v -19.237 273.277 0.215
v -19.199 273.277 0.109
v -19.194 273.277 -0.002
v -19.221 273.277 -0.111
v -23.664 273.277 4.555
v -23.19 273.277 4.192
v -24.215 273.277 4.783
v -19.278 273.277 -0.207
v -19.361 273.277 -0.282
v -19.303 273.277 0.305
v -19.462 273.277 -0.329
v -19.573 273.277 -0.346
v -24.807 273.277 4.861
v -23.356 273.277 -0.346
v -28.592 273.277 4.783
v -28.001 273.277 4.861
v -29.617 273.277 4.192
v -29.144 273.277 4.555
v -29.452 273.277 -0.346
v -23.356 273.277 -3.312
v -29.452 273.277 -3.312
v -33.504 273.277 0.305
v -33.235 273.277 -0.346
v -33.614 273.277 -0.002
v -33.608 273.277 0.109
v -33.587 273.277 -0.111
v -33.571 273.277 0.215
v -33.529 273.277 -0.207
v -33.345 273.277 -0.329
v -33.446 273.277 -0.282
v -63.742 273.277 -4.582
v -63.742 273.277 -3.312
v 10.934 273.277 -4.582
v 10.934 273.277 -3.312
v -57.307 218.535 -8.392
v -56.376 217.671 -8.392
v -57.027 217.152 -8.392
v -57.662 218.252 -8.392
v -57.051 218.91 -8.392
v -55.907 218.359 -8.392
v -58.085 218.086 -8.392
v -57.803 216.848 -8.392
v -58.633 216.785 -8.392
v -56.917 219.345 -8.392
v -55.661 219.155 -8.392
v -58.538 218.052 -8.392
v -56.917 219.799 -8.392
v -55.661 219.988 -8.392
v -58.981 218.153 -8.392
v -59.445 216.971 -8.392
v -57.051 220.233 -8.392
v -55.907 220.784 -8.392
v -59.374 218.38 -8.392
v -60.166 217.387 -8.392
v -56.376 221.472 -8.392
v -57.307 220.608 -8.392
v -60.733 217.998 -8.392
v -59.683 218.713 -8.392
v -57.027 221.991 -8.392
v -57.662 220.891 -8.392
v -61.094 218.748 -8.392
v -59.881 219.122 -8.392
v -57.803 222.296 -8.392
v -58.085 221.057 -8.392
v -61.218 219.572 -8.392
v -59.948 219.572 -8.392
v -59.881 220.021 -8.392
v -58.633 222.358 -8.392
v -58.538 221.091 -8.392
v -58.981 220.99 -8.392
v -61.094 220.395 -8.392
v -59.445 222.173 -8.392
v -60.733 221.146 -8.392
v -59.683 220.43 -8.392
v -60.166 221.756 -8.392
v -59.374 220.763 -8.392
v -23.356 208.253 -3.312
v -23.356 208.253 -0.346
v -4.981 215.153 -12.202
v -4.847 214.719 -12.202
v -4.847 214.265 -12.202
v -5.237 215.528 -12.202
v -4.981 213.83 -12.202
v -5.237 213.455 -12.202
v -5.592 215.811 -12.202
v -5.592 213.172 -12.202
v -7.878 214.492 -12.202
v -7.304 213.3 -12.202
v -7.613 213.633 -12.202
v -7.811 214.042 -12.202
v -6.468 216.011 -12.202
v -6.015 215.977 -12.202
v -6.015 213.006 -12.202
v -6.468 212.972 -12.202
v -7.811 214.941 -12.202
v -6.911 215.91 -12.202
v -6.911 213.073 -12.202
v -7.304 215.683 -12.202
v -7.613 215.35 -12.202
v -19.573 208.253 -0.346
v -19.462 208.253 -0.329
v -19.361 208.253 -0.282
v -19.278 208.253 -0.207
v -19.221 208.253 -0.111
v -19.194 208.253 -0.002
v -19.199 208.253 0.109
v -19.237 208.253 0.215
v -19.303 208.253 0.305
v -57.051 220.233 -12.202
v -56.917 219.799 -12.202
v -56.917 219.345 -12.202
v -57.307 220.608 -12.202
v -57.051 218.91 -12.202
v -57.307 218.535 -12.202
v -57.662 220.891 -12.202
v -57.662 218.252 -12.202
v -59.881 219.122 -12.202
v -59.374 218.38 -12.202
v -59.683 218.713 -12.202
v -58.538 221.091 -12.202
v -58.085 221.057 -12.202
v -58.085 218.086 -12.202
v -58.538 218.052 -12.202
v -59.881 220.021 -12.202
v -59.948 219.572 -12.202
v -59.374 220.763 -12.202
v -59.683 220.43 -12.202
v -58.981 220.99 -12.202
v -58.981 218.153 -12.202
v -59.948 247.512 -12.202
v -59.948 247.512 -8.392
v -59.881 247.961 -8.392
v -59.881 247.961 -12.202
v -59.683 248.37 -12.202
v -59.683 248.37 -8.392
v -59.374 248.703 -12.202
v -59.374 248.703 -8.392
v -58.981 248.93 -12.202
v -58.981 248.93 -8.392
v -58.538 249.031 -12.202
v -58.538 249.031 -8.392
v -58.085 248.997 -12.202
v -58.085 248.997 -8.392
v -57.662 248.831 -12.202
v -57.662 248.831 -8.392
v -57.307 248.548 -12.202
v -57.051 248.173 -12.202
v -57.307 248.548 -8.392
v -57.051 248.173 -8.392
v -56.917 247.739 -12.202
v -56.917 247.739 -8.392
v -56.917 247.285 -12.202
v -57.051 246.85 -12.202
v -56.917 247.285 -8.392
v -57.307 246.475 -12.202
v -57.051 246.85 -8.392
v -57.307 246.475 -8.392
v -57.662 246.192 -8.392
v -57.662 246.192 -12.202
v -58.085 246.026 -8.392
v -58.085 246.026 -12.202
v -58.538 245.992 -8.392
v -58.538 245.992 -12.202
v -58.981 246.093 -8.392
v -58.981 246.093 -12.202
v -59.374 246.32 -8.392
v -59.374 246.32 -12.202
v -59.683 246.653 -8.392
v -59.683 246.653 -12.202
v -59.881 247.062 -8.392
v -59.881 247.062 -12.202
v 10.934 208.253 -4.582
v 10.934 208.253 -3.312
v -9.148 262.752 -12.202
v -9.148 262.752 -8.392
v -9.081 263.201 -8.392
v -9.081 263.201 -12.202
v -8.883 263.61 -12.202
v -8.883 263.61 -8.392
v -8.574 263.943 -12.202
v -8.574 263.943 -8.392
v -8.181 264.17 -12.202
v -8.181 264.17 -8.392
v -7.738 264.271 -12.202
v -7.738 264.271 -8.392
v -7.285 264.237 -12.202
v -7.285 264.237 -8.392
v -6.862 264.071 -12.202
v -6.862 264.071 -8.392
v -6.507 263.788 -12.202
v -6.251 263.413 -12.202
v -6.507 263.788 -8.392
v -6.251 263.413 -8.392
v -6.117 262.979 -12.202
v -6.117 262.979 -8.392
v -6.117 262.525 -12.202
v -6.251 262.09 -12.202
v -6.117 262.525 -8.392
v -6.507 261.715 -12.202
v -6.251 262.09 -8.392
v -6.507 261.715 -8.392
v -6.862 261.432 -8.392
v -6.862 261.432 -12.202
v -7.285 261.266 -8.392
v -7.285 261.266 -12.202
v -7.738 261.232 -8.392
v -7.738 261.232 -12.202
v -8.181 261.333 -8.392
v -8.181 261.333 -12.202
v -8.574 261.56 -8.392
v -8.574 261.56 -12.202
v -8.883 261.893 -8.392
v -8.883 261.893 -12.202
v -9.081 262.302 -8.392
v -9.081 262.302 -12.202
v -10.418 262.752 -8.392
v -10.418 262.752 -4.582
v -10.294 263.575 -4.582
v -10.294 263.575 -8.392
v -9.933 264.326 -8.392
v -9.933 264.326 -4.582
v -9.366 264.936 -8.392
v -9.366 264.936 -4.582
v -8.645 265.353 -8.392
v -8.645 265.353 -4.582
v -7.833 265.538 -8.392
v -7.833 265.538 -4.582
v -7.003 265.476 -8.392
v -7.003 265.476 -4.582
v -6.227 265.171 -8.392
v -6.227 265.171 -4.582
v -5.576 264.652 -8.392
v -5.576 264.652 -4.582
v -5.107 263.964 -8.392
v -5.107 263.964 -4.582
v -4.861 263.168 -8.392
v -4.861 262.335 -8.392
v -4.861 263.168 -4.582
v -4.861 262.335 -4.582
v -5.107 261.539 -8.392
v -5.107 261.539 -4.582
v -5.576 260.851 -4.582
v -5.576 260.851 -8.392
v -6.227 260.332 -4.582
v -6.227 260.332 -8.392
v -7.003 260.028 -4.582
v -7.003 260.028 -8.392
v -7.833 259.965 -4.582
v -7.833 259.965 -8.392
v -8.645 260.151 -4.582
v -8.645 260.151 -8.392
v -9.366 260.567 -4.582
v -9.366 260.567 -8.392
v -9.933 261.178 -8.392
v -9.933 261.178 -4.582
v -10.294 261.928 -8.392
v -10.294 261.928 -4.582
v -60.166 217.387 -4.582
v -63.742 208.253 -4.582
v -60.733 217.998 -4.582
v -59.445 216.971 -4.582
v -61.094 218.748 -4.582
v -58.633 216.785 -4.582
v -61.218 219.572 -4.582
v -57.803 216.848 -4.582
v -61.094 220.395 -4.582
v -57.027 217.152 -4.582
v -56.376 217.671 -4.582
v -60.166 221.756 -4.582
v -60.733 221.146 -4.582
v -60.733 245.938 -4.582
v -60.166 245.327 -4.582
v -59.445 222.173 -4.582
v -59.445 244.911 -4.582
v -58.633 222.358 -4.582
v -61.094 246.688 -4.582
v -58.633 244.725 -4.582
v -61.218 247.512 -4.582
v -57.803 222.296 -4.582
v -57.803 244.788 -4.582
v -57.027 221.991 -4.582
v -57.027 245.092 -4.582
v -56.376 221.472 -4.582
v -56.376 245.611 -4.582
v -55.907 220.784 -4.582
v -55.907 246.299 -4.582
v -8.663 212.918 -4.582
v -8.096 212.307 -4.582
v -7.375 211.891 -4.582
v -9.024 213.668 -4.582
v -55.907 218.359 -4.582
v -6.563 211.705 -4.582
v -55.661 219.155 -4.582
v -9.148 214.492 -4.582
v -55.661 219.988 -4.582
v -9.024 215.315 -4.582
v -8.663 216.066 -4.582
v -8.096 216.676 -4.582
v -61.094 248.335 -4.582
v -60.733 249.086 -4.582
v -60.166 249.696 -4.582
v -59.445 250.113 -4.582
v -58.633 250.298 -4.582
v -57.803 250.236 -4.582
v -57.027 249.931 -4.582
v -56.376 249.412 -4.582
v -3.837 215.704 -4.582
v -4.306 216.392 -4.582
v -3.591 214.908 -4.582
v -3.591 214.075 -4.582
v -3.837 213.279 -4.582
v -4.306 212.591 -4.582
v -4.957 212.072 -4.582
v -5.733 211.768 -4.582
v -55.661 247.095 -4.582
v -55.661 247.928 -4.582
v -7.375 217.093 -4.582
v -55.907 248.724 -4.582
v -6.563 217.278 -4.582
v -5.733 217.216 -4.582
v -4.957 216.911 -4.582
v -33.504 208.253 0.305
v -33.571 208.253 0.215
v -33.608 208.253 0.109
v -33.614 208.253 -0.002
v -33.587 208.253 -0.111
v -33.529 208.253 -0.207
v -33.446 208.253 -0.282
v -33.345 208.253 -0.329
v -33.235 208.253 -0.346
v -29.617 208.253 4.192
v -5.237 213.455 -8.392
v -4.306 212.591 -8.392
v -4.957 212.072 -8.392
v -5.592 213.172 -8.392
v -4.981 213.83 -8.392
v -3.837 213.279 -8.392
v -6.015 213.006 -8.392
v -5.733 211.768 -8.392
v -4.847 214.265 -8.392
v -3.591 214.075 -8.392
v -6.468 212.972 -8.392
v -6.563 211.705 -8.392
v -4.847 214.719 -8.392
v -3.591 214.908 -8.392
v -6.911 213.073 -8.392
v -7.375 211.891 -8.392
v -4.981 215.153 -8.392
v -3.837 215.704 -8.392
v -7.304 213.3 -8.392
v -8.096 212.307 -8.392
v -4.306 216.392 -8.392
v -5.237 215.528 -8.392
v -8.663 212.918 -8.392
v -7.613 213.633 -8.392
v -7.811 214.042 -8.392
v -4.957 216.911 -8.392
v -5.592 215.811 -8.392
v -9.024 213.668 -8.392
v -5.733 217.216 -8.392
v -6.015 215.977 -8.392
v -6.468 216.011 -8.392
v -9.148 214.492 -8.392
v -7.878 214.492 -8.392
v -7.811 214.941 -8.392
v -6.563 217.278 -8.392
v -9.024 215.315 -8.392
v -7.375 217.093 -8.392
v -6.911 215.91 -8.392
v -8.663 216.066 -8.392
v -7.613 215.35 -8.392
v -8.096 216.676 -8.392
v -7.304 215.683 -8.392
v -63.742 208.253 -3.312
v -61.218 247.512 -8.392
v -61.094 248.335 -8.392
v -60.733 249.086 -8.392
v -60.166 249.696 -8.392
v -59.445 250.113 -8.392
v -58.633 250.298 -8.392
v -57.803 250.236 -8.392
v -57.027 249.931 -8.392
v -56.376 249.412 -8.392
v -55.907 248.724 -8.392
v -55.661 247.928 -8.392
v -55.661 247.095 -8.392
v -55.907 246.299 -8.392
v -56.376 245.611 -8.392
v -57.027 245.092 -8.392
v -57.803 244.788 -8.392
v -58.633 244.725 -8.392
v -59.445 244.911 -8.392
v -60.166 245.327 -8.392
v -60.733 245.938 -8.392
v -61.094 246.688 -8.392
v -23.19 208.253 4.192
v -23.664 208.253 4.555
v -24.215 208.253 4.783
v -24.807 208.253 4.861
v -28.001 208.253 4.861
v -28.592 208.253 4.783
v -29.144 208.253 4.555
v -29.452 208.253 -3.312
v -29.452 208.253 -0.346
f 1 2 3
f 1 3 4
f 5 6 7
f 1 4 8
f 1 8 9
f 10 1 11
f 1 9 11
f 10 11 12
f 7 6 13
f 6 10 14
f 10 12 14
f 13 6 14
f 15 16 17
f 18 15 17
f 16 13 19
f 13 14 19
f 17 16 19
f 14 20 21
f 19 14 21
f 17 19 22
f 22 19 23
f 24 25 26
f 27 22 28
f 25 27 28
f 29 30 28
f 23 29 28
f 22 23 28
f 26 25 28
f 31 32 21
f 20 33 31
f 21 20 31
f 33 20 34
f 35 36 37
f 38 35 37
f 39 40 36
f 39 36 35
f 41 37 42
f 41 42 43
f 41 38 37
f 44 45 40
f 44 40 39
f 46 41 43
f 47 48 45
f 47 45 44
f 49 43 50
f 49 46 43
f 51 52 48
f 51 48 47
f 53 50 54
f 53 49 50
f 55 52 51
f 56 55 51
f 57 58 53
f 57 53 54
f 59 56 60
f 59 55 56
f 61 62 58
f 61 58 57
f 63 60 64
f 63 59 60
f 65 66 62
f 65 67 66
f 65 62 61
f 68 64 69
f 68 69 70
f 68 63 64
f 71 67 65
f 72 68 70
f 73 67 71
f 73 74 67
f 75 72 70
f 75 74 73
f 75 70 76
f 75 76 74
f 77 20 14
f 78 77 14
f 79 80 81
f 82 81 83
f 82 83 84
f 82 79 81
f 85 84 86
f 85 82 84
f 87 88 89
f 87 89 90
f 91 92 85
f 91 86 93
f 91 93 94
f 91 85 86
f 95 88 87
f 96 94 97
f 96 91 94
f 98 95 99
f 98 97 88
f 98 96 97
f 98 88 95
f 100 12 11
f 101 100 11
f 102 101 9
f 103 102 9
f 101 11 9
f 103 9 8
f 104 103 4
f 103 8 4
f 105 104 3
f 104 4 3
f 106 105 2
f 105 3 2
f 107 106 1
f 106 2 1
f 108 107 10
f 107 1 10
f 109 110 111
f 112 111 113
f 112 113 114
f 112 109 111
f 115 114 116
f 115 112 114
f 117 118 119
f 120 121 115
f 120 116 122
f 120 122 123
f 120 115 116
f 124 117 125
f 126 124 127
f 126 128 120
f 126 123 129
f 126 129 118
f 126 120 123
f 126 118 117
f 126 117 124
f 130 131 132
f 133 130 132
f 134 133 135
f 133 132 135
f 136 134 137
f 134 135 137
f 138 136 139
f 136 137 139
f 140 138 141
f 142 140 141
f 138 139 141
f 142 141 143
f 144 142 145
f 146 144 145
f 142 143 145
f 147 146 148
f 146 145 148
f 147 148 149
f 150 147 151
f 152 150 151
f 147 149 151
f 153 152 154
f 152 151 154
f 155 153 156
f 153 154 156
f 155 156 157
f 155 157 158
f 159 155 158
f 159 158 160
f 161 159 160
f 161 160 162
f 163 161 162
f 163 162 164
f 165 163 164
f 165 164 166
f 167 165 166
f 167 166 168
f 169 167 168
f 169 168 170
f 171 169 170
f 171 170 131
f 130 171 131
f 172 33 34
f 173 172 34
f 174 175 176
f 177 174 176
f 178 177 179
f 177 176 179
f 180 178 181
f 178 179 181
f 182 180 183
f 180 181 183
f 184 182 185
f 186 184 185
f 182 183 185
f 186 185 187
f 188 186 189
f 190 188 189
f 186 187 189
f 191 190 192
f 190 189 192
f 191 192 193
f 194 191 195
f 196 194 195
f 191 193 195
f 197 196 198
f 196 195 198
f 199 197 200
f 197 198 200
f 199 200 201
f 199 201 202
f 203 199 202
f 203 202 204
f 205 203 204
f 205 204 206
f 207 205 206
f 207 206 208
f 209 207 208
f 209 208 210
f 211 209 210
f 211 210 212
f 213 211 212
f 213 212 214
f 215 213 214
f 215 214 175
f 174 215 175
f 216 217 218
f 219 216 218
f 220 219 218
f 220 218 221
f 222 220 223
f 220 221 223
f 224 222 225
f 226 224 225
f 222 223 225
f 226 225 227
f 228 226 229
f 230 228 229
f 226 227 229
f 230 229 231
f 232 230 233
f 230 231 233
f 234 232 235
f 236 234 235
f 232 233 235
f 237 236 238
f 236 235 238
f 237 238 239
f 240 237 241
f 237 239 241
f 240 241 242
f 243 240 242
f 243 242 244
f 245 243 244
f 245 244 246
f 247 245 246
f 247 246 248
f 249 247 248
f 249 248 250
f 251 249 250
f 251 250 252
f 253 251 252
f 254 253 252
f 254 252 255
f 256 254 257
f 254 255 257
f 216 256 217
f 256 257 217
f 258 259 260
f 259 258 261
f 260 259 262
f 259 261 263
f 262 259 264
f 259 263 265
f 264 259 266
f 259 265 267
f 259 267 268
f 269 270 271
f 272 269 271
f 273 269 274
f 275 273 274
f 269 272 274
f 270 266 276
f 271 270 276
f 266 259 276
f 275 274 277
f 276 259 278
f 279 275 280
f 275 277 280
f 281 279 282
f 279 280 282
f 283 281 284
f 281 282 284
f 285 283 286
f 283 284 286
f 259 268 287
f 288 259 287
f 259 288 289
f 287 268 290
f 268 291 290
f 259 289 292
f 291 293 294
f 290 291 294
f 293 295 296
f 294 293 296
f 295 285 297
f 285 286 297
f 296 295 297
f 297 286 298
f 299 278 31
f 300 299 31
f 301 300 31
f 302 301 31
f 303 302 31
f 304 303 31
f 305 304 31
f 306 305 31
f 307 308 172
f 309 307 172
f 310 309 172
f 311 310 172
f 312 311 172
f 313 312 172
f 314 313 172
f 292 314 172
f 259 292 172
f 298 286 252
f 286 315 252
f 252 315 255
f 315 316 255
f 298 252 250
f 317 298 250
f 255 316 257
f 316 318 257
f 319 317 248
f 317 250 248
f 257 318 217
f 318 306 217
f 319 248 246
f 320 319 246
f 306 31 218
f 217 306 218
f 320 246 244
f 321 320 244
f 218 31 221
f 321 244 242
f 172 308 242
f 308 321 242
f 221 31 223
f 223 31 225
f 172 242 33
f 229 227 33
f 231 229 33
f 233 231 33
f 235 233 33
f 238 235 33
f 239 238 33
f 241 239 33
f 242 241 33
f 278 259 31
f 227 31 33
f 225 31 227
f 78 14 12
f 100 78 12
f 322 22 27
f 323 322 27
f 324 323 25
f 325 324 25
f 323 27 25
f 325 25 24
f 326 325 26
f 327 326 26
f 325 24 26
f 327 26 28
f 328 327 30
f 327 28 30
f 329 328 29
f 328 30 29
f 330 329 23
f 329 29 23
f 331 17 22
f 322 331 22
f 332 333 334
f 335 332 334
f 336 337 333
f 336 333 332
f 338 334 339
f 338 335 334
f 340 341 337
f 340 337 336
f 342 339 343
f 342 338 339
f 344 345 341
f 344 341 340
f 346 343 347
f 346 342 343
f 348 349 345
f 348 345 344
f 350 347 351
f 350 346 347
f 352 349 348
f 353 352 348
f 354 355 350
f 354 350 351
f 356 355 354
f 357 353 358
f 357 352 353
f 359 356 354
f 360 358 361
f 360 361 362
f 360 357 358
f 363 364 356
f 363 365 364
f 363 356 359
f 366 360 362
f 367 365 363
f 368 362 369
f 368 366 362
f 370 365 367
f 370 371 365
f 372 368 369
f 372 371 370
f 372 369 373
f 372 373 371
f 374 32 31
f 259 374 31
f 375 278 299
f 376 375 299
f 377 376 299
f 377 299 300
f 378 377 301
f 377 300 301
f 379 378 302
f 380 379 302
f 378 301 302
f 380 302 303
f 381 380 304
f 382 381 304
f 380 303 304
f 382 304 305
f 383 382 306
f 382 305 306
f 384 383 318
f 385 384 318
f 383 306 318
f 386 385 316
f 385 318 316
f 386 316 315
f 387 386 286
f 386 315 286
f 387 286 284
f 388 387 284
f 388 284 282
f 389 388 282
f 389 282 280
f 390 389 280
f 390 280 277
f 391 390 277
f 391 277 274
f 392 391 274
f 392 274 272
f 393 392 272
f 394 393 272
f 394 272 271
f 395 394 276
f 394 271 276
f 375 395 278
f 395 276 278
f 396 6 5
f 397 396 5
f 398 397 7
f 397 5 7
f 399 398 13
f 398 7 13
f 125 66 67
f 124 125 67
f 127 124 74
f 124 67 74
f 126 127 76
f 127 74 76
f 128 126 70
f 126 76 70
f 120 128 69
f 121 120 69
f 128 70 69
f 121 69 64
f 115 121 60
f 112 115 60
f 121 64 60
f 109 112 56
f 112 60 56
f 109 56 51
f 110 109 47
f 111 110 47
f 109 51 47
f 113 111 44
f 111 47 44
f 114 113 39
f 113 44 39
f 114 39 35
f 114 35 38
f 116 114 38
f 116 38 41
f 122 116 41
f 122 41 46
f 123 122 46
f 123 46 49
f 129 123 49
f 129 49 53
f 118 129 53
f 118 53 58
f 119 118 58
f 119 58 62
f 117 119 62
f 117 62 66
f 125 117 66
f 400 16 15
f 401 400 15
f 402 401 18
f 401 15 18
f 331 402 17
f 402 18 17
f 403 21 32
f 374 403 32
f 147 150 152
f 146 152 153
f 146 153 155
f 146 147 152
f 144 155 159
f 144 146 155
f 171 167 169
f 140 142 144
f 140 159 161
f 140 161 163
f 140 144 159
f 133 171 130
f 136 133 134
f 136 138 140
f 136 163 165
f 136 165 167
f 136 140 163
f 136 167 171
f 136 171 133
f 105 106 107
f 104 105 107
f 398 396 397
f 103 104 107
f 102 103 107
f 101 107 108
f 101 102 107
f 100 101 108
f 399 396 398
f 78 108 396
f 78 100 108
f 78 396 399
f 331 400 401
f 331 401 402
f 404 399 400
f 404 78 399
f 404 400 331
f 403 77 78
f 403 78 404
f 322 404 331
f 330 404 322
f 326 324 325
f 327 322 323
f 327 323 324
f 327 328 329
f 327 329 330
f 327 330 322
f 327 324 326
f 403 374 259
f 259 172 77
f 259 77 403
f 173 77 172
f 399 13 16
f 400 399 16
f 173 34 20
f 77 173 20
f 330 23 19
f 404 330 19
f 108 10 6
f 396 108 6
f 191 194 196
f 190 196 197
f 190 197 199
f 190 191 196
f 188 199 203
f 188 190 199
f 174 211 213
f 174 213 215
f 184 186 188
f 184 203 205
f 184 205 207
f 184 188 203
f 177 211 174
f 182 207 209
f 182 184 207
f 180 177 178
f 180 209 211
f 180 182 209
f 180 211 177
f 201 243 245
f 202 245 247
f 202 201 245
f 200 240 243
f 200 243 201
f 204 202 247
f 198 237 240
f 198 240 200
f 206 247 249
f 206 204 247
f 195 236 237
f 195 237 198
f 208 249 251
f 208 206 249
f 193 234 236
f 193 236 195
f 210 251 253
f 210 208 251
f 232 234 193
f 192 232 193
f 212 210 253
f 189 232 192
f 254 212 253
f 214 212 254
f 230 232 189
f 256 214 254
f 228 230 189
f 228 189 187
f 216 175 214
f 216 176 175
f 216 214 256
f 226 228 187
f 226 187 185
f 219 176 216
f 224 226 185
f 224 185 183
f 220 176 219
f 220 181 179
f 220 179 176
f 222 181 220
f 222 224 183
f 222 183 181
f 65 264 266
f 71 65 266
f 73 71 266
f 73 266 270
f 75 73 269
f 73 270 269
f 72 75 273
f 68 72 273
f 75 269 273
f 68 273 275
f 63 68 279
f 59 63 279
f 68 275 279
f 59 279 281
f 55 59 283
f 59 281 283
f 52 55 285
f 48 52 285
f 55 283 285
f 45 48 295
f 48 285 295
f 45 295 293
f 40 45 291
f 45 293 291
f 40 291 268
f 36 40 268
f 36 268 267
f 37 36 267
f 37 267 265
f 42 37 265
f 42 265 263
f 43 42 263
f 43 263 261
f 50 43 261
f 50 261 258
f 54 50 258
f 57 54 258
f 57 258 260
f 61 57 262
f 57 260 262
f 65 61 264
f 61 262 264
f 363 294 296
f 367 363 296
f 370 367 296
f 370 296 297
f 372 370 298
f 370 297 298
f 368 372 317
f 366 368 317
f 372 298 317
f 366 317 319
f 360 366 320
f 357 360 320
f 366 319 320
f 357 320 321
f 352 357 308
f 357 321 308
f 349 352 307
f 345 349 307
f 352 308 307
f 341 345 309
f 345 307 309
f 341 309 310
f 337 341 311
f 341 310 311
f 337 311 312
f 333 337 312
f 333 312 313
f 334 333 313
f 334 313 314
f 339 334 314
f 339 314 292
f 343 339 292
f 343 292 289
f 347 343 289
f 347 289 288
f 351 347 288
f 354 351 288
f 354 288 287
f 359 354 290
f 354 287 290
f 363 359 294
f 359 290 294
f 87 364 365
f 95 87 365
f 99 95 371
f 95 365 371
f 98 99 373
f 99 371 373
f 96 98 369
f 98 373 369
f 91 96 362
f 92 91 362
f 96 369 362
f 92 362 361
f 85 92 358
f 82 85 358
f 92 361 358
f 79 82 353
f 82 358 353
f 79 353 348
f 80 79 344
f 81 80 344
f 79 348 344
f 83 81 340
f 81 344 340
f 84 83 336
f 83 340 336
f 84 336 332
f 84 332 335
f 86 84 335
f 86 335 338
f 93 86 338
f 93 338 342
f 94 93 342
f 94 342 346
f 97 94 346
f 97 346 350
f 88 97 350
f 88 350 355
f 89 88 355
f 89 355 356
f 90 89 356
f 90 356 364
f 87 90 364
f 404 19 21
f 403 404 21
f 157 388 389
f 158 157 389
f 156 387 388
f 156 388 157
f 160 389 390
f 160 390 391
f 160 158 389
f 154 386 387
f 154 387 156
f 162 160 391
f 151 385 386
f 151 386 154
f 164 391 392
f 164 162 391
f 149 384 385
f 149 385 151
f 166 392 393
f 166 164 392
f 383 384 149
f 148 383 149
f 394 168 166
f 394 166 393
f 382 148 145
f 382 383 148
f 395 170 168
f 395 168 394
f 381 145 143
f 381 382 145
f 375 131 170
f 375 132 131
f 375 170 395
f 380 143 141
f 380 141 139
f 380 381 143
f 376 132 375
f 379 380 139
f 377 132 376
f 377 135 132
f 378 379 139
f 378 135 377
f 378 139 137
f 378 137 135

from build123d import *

# Parameters (mm, degrees)
BOSS_EXTRUDE1_DEPTH = 65.024
SKETCH8_R           = 1.524
BOSS_EXTRUDE4_DEPTH = 7.62
SKETCH9_R           = 2.794
BOSS_EXTRUDE5_DEPTH = 3.81


with BuildPart() as part:
    # Sketch2 → Boss-Extrude1 (new body)
    with BuildSketch(Plane(origin=(0, 273.277204506, 0), x_dir=(1, 0, 0), z_dir=(0, 1, 0))):
        with BuildLine():
            Line((-29.45165626, 3.139900531), (-29.45165626, 3.311685007))
            Line((-29.45165626, 3.311685007), (-63.74165626, 3.311685007))
            Line((-63.74165626, 3.311685007), (-63.74165626, 4.581685007))
            Line((-63.74165626, 4.581685007), (10.93434374, 4.581685007))
            Line((10.93434374, 4.581685007), (10.93434374, 3.311685007))
            Line((10.93434374, 3.311685007), (-23.35565626, 3.311685007))
            Line((-23.35565626, 3.311685007), (-23.35565626, 3.139900531))
            Line((-23.35565626, 3.139900531), (-23.35565626, 0.345900531))
            Line((-23.35565626, 0.345900531), (-19.572733097, 0.345900531))
            ThreePointArc((-19.572733097, 0.345900531), (-19.220734995, 0.110702919), (-19.303325413, -0.304507152))
            Line((-19.303325413, -0.304507152), (-23.190363831, -4.19154557))
            ThreePointArc((-23.190363831, -4.19154557), (-23.931995607, -4.68708808), (-24.806809933, -4.861099469))
            Line((-24.806809933, -4.861099469), (-28.000502588, -4.861099469))
            ThreePointArc((-28.000502588, -4.861099469), (-28.875316914, -4.68708808), (-29.616948689, -4.19154557))
            Line((-29.616948689, -4.19154557), (-33.503987108, -0.304507152))
            ThreePointArc((-33.503987108, -0.304507152), (-33.586577526, 0.110702919), (-33.234579424, 0.345900531))
            Line((-33.234579424, 0.345900531), (-29.45165626, 0.345900531))
            Line((-29.45165626, 0.345900531), (-29.45165626, 3.139900531))
        make_face()
    extrude(amount=-BOSS_EXTRUDE1_DEPTH)

    # Sketch8 → Boss-Extrude4 (add)
    with BuildSketch(Plane(origin=(0, 0, -4.581685007), x_dir=(-1, 0, 0), z_dir=(0, 0, -1))):
        with Locations((7.624251866, 262.75164523)):
            Circle(SKETCH8_R)
        with Locations((58.424251866, 247.51164523)):
            Circle(SKETCH8_R)
        with Locations((58.424251866, 219.57164523)):
            Circle(SKETCH8_R)
        with Locations((6.354251866, 214.49164523)):
            Circle(SKETCH8_R)
    extrude(amount=BOSS_EXTRUDE4_DEPTH)

    # Sketch9 → Boss-Extrude5 (add)
    with BuildSketch(Plane(origin=(0, 0, -4.581685007), x_dir=(-1, 0, 0), z_dir=(0, 0, -1))):
        with Locations((7.624251866, 262.75164523)):
            Circle(SKETCH9_R)
        with Locations((58.424251866, 247.51164523)):
            Circle(SKETCH9_R)
        with Locations((6.354251866, 214.49164523)):
            Circle(SKETCH9_R)
        with Locations((58.424251866, 219.57164523)):
            Circle(SKETCH9_R)
    extrude(amount=BOSS_EXTRUDE5_DEPTH)


solid = part.part
